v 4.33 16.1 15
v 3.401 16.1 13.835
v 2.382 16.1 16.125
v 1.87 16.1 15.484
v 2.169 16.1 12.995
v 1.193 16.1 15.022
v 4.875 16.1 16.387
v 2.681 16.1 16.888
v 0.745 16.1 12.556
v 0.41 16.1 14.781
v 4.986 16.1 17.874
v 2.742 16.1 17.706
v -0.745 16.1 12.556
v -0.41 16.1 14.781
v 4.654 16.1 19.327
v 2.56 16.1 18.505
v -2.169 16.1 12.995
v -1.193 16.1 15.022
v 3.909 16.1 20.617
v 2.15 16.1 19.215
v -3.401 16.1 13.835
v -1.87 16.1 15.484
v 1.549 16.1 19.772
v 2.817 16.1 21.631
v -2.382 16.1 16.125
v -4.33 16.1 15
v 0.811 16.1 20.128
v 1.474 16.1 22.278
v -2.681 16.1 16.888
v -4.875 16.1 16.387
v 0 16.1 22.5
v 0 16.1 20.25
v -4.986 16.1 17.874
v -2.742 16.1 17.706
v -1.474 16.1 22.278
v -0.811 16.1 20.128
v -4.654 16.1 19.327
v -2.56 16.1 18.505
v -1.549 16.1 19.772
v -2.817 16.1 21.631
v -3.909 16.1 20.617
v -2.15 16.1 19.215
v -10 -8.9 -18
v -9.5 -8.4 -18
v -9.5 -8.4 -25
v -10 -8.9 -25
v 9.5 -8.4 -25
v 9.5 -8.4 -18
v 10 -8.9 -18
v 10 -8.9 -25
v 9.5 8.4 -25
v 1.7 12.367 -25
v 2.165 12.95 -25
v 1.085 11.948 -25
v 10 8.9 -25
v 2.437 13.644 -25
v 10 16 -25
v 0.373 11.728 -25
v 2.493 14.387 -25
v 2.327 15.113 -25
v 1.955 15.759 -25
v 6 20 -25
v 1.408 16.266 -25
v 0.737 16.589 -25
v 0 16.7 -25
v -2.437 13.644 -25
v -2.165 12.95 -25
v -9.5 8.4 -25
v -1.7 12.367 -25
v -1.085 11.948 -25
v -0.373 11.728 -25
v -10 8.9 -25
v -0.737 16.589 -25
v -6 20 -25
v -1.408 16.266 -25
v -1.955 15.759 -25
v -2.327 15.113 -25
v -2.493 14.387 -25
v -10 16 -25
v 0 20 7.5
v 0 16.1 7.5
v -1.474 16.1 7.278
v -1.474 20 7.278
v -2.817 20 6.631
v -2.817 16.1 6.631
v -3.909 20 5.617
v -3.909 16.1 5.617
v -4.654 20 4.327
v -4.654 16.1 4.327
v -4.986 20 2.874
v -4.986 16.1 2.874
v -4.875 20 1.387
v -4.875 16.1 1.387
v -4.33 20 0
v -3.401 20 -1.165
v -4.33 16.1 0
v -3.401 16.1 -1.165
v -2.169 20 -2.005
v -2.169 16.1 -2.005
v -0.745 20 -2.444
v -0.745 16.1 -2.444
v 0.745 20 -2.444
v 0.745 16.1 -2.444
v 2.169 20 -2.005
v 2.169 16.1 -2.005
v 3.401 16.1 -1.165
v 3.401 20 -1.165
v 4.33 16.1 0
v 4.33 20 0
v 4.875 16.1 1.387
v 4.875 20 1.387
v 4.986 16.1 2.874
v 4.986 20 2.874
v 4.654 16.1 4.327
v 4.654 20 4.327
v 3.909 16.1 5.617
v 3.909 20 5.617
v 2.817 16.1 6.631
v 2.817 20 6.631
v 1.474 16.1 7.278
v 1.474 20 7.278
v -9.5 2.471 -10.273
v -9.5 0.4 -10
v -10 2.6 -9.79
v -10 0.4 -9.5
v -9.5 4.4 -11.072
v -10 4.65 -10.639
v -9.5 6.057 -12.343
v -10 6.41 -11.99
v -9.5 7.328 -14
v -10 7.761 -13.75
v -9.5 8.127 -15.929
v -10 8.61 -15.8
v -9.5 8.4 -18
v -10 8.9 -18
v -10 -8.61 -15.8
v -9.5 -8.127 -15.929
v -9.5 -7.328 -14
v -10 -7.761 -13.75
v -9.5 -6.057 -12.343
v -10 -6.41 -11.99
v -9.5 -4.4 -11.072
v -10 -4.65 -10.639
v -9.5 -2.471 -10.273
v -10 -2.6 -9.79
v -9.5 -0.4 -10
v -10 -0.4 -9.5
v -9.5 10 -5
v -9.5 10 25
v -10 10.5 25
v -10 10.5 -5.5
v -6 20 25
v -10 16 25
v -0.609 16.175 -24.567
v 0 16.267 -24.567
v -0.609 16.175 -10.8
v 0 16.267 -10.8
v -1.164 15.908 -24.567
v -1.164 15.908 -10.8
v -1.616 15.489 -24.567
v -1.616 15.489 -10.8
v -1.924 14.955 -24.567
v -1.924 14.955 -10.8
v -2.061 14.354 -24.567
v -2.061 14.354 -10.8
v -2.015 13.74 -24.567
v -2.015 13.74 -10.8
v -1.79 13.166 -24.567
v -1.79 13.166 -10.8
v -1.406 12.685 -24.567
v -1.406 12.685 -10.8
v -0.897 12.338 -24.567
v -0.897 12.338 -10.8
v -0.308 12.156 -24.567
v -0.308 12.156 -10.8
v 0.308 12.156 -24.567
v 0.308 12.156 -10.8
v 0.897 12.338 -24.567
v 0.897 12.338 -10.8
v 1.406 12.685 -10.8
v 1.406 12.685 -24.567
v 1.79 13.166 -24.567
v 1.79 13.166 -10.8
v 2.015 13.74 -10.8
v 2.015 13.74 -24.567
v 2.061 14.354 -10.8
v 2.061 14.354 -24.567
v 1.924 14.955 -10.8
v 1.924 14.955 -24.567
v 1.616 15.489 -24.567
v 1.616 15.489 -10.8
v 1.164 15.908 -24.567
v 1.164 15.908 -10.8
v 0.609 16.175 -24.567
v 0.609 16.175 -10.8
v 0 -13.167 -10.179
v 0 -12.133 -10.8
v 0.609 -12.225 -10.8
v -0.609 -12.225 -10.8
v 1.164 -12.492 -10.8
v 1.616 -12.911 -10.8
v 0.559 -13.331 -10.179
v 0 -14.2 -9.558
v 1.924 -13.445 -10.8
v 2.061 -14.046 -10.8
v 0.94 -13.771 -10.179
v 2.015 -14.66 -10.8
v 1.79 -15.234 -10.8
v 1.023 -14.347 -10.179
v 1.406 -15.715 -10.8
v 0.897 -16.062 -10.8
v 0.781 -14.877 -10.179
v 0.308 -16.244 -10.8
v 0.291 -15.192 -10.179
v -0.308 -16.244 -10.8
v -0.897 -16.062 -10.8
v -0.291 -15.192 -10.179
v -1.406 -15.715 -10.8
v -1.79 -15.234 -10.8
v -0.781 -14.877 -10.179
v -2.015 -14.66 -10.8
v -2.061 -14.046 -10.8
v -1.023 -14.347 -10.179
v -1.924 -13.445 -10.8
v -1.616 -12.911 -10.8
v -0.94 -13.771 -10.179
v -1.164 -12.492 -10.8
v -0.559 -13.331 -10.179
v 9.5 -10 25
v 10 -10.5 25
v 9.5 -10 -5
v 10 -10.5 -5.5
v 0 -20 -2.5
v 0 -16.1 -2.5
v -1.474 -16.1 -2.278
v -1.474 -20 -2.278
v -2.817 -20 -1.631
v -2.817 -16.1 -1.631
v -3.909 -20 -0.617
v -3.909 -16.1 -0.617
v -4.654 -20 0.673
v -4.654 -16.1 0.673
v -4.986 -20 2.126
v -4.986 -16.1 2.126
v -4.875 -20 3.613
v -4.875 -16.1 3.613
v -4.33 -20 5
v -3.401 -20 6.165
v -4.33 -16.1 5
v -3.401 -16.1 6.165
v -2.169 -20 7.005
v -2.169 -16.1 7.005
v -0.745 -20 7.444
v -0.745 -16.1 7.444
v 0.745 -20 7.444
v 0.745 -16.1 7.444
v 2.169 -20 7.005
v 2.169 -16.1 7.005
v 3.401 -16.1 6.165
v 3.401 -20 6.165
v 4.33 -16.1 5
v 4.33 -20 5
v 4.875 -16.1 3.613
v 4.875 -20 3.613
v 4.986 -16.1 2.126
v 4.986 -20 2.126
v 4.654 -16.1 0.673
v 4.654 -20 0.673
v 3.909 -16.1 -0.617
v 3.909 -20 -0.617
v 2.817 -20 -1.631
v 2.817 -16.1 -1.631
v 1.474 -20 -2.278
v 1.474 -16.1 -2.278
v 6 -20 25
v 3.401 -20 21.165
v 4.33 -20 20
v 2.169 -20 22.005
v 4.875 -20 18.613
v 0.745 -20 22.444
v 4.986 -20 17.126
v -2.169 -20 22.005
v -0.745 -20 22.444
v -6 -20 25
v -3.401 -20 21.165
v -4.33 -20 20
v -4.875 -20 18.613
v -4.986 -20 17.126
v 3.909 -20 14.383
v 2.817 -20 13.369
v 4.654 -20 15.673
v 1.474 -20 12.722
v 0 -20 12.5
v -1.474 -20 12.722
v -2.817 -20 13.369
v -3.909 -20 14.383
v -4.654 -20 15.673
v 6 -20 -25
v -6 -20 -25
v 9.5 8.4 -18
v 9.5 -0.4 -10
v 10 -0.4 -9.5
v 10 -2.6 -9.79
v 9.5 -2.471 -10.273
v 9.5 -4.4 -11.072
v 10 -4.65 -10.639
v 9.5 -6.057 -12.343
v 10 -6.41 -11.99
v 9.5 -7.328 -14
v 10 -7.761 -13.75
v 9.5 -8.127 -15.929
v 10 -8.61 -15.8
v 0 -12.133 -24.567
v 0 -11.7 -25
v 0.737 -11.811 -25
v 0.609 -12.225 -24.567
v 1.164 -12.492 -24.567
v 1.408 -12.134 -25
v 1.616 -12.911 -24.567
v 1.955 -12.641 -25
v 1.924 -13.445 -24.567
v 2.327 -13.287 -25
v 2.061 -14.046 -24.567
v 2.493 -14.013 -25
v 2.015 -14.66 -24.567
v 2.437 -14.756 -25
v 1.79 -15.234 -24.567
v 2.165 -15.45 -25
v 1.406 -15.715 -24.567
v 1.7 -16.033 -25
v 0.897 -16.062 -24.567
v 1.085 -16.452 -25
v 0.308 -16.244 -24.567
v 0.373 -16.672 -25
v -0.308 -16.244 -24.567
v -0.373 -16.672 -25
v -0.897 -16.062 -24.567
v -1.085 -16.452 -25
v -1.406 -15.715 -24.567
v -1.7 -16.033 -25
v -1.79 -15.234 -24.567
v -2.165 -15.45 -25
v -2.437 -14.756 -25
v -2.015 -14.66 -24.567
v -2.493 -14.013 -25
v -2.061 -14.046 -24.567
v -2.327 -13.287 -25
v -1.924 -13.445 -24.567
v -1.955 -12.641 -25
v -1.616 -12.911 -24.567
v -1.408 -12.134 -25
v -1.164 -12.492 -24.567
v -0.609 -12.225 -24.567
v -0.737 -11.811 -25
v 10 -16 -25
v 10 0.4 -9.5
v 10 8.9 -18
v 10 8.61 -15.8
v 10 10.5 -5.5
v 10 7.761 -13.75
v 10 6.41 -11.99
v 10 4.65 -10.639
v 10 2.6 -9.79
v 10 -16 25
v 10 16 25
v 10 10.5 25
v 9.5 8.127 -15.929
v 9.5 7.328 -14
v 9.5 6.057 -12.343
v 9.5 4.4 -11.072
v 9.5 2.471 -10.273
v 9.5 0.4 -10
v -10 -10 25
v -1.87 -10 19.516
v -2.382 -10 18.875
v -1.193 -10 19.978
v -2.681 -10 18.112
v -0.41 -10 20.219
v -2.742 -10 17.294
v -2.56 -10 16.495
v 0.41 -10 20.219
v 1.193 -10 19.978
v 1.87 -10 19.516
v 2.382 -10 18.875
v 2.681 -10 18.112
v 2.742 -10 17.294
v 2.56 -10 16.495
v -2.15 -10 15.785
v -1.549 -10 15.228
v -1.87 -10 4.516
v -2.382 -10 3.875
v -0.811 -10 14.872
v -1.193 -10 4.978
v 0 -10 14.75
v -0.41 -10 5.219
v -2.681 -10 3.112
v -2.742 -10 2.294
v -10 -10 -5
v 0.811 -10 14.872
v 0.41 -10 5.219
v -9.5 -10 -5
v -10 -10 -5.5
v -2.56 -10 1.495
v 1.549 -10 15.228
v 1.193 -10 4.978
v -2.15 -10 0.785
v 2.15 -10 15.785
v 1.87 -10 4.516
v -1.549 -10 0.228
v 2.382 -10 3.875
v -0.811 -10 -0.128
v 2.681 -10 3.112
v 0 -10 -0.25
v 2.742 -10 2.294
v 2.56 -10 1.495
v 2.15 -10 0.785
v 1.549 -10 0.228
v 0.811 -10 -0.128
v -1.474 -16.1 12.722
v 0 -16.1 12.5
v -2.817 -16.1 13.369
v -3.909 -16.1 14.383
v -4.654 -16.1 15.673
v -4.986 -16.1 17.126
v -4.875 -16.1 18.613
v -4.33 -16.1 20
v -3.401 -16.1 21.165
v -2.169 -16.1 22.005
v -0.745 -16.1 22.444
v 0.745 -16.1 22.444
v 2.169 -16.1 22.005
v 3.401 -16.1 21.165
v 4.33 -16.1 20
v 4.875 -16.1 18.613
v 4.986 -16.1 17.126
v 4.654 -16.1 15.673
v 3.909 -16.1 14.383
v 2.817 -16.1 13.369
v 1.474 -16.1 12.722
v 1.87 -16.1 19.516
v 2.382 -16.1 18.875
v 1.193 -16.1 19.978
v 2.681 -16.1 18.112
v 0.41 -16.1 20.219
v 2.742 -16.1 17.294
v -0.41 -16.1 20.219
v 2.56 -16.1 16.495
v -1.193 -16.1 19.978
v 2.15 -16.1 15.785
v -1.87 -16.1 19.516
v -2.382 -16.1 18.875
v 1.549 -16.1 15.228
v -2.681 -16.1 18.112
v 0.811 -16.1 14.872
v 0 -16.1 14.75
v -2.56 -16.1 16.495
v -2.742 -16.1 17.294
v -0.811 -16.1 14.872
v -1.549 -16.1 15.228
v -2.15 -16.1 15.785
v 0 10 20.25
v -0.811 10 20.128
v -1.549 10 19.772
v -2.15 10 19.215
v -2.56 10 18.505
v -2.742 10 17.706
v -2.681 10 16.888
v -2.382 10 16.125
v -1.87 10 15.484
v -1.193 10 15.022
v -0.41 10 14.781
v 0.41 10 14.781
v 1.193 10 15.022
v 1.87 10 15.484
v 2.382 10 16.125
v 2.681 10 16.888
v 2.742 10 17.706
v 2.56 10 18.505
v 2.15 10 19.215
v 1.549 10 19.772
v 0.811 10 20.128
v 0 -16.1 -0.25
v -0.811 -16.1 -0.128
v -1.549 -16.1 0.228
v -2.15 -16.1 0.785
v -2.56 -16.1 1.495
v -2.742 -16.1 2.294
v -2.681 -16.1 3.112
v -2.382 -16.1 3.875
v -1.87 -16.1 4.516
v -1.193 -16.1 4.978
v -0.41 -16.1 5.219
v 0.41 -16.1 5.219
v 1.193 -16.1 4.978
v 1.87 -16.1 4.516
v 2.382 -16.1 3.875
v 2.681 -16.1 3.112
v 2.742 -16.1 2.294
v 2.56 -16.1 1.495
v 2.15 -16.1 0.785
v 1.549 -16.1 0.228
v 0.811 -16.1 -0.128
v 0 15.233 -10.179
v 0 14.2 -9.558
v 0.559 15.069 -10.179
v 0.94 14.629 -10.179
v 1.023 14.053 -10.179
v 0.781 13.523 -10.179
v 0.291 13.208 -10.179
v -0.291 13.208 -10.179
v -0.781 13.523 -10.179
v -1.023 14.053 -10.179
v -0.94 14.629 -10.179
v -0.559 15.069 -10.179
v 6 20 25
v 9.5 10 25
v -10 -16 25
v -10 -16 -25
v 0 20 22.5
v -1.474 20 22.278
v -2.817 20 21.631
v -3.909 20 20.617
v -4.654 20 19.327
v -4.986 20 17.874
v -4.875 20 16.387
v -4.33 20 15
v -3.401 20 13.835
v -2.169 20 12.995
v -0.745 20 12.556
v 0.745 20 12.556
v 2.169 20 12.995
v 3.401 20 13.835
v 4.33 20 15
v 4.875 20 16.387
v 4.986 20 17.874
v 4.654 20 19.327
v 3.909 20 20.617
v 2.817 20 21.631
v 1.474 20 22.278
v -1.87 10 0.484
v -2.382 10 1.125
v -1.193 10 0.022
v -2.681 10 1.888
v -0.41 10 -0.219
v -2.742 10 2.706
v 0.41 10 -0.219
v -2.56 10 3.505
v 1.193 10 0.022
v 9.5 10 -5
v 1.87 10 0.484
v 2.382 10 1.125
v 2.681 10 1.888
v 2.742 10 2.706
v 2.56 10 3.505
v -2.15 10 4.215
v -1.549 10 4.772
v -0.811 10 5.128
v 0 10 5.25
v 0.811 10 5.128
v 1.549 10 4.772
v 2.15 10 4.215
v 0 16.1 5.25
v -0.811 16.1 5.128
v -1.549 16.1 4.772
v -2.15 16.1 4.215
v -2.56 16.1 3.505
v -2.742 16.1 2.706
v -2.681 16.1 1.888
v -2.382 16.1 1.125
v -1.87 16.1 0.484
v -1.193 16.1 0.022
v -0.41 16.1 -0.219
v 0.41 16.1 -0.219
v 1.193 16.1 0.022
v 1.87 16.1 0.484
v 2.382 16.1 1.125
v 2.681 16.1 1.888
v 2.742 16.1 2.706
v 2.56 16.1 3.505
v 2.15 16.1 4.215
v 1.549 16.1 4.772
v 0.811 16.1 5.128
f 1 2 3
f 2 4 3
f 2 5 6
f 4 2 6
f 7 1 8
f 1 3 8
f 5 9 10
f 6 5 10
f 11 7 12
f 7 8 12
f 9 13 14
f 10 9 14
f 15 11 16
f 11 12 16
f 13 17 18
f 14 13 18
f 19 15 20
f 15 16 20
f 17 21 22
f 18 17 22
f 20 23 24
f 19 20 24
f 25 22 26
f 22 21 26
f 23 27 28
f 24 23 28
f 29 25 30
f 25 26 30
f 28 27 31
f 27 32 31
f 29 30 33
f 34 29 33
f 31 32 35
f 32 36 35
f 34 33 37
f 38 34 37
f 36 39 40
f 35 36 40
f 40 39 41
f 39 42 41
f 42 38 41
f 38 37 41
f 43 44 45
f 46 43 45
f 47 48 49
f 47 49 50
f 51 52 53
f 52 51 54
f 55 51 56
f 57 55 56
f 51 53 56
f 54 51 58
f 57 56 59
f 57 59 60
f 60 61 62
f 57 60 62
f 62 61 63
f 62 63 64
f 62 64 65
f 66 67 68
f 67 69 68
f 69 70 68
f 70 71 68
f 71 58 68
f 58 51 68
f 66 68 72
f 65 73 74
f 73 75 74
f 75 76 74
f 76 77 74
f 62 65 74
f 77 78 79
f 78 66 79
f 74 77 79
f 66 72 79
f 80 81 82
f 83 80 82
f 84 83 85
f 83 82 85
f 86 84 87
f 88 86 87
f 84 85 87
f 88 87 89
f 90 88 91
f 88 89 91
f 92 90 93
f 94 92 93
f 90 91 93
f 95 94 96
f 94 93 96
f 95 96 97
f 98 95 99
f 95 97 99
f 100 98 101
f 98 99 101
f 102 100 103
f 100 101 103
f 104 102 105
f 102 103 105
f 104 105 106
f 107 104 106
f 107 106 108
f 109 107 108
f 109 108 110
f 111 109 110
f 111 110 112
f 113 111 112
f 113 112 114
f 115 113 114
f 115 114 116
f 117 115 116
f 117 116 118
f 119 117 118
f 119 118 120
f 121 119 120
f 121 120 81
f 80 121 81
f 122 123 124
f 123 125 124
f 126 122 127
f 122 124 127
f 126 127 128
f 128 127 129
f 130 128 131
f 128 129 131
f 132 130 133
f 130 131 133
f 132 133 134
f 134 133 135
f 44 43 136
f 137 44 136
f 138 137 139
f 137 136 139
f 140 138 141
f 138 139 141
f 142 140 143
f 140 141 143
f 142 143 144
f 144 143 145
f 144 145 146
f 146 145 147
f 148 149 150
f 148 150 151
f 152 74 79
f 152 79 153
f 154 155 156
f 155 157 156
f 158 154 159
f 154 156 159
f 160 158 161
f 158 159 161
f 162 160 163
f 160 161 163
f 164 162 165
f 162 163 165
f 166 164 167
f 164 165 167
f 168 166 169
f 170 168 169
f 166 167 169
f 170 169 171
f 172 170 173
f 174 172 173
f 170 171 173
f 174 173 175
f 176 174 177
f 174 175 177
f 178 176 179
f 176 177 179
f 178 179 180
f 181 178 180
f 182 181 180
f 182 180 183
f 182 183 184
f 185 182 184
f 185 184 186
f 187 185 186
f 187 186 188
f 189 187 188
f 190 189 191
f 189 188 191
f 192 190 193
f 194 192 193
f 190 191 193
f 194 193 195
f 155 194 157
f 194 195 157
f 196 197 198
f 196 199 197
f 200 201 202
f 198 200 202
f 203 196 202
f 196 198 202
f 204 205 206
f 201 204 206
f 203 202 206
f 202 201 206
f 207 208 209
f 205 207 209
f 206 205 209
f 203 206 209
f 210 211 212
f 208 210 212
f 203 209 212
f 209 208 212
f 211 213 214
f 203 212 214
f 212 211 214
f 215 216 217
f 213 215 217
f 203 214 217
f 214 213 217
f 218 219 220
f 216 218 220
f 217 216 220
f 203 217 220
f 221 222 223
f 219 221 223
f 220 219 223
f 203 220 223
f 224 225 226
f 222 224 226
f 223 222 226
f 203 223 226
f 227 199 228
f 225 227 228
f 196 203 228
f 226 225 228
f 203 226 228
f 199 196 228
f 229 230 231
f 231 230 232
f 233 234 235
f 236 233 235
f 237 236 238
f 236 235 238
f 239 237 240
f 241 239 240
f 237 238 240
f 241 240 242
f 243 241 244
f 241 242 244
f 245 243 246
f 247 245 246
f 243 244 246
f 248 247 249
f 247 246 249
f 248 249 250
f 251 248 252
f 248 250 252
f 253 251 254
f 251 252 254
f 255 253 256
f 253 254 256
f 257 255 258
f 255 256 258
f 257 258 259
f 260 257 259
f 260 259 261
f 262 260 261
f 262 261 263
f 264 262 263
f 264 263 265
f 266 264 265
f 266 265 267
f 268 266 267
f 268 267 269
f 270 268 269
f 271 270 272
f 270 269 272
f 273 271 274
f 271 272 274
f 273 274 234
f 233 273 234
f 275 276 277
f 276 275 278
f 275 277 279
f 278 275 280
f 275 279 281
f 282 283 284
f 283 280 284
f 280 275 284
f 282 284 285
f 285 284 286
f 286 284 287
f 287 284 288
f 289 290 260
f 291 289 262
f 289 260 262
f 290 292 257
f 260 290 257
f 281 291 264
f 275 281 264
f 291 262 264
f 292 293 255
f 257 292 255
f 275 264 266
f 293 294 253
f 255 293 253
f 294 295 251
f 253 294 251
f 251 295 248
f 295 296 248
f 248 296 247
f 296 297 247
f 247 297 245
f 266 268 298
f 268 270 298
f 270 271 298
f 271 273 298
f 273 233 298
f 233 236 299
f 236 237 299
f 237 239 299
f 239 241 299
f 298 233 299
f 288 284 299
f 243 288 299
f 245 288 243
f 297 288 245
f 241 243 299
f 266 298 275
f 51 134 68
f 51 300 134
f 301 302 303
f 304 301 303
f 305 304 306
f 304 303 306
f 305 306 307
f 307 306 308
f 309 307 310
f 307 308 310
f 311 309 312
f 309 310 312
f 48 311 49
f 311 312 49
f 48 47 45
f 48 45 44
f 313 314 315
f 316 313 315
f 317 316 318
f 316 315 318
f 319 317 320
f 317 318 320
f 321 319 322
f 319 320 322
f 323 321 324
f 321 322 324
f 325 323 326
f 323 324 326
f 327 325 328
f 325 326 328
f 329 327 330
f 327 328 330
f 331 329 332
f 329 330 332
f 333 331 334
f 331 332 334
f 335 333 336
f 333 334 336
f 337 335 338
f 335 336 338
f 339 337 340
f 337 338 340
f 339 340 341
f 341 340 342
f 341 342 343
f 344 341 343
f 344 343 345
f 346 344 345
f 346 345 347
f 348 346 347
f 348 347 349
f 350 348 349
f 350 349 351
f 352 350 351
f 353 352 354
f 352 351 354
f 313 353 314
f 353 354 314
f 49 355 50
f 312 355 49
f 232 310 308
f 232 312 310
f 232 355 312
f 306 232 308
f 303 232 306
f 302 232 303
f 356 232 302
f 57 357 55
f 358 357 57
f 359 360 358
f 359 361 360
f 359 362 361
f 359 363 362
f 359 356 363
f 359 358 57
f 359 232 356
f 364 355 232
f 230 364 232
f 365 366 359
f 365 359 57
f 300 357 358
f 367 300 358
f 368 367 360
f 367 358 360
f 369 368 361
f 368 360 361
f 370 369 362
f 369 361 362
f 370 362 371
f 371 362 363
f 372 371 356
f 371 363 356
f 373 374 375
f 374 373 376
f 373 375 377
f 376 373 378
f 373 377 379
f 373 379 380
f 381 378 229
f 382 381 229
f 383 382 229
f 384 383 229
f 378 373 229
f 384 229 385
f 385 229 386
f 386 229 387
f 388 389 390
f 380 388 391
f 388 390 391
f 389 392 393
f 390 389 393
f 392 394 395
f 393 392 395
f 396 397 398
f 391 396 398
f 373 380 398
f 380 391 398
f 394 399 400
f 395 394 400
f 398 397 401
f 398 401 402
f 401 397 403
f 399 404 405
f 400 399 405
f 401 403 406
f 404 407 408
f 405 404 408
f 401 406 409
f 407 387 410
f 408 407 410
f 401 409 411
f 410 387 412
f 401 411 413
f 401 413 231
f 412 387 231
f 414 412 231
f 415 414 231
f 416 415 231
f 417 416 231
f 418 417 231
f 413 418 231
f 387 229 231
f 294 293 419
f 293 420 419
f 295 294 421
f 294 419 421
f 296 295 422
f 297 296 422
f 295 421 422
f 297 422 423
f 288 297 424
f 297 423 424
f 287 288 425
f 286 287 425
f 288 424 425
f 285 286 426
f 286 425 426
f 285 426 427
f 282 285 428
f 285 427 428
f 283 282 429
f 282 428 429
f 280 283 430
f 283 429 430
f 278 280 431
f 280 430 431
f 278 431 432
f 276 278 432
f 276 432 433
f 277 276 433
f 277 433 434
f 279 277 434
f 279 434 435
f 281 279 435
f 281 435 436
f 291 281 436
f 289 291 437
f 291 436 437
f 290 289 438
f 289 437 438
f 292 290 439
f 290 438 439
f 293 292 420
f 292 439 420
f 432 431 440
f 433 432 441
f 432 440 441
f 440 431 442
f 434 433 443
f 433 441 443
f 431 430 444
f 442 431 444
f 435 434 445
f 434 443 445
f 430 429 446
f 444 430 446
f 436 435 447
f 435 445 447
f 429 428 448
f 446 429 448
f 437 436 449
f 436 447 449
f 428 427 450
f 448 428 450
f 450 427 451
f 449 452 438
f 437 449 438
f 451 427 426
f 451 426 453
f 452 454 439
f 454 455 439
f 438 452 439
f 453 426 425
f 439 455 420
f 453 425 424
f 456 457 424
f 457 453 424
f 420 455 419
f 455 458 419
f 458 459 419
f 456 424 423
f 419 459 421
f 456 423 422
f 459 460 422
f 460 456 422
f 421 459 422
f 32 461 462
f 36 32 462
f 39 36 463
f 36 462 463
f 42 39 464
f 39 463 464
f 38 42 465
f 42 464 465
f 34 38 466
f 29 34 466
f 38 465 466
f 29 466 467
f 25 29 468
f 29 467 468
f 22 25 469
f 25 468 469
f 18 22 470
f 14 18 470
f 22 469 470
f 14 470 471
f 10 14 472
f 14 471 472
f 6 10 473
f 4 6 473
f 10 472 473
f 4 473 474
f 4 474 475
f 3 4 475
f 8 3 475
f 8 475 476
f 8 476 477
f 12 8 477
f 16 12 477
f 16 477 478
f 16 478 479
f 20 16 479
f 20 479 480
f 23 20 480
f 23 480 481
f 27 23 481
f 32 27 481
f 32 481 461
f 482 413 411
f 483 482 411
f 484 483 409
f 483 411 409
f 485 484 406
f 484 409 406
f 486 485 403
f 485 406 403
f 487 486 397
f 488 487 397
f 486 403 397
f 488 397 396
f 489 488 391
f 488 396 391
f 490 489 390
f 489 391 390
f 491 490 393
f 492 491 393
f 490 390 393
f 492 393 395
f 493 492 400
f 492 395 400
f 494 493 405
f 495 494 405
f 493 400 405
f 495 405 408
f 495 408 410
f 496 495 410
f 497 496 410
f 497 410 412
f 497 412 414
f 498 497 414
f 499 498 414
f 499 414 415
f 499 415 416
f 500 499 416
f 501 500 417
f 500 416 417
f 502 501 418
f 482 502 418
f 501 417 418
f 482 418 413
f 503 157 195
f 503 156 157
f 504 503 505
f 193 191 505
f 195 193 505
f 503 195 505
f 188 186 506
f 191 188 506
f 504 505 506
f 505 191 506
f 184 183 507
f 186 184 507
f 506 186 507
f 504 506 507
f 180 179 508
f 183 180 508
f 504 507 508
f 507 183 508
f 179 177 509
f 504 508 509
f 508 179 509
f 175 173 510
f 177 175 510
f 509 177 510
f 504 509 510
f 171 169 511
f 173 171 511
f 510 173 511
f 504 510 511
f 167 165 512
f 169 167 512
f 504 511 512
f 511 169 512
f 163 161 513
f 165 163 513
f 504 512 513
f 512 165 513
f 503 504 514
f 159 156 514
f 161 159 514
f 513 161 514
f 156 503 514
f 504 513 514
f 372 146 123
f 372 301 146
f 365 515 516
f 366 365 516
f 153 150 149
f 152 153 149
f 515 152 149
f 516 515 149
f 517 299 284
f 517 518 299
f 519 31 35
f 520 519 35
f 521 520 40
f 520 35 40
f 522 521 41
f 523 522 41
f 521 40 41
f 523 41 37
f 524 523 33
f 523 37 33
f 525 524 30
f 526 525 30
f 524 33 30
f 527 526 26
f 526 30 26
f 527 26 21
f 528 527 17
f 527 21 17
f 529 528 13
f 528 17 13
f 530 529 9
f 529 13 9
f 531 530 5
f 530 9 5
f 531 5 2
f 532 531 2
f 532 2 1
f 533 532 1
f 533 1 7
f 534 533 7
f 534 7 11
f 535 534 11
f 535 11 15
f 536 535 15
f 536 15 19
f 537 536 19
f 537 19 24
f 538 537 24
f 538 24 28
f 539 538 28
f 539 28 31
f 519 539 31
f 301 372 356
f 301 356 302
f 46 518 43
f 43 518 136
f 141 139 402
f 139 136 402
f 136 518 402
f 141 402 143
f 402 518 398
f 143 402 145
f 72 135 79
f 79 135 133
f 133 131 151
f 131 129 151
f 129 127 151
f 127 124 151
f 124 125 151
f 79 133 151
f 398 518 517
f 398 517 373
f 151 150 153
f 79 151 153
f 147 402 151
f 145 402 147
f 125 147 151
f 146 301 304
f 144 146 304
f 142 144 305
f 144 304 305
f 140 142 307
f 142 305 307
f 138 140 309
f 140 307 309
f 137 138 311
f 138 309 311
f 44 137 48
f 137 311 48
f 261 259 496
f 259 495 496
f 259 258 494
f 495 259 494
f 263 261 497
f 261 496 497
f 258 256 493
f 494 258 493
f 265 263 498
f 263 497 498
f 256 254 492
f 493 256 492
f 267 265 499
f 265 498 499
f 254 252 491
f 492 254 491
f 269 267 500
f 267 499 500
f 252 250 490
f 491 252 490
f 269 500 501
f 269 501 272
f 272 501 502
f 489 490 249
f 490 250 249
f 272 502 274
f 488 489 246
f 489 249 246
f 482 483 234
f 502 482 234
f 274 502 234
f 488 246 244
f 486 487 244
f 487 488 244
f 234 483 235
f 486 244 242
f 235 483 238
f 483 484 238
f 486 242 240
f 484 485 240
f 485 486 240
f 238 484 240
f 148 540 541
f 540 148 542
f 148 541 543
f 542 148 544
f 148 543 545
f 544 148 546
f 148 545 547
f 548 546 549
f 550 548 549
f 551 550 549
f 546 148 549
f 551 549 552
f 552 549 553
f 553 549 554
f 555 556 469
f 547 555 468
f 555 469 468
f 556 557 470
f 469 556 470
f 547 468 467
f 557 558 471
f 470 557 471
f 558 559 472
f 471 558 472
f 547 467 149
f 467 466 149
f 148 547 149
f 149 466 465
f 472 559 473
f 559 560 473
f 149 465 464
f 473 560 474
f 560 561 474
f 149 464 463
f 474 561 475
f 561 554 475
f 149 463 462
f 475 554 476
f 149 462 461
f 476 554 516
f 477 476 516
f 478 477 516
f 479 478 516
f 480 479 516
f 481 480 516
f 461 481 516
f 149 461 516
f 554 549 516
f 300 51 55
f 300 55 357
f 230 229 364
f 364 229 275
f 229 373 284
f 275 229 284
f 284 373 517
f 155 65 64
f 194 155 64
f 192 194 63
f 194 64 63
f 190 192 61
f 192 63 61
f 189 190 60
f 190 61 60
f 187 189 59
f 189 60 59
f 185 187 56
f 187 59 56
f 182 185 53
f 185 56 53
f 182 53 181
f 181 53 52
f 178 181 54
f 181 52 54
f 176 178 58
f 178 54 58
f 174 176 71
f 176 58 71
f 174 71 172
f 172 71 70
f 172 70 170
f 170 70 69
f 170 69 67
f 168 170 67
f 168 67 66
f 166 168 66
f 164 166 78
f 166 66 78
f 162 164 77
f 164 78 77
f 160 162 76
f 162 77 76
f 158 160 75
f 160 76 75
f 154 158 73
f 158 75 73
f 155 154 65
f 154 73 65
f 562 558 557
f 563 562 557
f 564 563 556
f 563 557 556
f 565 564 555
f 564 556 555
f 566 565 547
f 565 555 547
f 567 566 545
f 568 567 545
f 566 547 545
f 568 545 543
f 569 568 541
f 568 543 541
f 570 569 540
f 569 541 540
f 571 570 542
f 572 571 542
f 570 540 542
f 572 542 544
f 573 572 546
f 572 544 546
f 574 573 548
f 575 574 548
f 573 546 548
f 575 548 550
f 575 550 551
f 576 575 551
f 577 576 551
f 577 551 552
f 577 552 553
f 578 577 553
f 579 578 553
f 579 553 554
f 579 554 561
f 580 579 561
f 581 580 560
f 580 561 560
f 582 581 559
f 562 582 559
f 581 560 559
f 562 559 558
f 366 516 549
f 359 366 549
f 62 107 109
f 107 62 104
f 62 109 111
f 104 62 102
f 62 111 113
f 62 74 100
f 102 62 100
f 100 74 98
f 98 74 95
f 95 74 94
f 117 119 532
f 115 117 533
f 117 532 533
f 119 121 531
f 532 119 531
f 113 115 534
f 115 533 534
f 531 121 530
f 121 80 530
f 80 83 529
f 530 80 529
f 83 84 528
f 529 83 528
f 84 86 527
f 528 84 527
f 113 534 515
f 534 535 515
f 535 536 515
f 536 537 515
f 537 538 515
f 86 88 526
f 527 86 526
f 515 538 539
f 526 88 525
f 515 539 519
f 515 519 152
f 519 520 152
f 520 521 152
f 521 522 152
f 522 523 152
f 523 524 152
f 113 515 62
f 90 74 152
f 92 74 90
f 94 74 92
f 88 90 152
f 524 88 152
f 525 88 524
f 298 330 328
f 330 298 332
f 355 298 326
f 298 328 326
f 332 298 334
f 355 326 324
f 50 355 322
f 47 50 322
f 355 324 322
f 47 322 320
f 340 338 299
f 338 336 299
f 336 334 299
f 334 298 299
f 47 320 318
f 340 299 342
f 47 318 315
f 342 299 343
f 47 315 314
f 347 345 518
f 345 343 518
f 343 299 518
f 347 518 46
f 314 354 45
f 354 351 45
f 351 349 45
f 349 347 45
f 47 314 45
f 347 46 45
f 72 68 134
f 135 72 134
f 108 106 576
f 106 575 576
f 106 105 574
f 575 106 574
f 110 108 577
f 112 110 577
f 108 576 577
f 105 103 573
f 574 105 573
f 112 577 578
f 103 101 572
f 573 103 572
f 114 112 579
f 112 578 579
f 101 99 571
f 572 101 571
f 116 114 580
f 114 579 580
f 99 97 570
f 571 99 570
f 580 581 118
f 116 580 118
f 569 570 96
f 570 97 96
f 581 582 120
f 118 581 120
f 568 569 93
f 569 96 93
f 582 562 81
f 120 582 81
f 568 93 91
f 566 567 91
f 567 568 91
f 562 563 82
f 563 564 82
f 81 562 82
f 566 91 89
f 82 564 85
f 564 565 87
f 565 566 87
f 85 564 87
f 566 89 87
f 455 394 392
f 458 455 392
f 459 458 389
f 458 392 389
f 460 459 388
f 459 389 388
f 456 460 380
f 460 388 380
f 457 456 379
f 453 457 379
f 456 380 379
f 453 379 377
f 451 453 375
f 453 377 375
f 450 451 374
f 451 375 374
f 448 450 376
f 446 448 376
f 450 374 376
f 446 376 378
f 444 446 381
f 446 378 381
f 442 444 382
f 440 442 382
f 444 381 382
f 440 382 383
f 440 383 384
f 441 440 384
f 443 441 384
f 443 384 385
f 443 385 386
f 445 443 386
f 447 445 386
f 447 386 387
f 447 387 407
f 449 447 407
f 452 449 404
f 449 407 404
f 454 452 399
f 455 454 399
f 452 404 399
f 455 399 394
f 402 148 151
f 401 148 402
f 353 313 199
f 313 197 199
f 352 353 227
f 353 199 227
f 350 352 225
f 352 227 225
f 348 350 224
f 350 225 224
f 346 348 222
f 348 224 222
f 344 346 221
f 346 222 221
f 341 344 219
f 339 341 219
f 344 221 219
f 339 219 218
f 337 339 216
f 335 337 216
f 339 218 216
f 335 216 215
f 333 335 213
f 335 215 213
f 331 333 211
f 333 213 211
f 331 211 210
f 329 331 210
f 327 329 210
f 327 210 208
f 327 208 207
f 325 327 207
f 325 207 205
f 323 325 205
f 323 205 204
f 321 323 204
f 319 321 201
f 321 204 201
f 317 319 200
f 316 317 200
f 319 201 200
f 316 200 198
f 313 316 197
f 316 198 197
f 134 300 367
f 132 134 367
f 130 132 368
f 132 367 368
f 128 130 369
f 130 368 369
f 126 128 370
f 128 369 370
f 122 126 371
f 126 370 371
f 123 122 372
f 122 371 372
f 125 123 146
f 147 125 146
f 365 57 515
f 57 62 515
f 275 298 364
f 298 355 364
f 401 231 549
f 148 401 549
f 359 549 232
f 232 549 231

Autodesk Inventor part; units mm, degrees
ref_plane "YZ Plane" through (0, 0, 0) normal (1, 0, 0) x (0, 1, 0)
ref_plane "XZ Plane" through (0, 0, 0) normal (0, 1, 0) x (-1, 0, 0)
ref_plane "XY Plane" through (0, 0, 0) normal (0, 0, 1) x (1, 0, 0)
sketch "Skizze1" plane through (0, 0, 0) normal (1, 0, 0) x (0, 1, 0)
  line L0 (-28, 0) -> (28, 0) construction
  line L1 (0, 35) -> (0, -35) construction
  line L2 (-20, -25) -> (20, -25)
  line L3 (20, -25) -> (20, 25)
  line L4 (20, 25) -> (-20, 25)
  line L5 (-20, 25) -> (-20, -25)
  line L6 (-20, -25) -> (20, 25) construction
  line L7 (20, -25) -> (-20, 25) construction
  point P0 (0, 0)
  dimension "d0" = 40
  dimension "d1" = 50
extrude "Grundkörper" add sketch "Skizze1" along normal mid plane 20
sketch "Skizze2" plane through (10, 0, 0) normal (1, 0, 0) x (0, 0, -1)
  line L0 (-25, 20) -> (-25, -20) construction
  line L1 (0, -28) -> (0, 28) construction
  line L2 (-35, 0) -> (35, 0) construction
  line L3 (-25, -10) -> (5, -10)
  line L4 (5, -10) -> (5, 10)
  line L5 (5, 10) -> (-25, 10)
  line L6 (-25, 10) -> (-25, -10)
  line L7 (25, -20) -> (25, 20) construction
  line L8 (25, -8.4) -> (18, -8.4)
  line L9 (10, -0.4) -> (10, 0.4)
  line L10 (18, 8.4) -> (25, 8.4)
  line L11 (25, -8.4) -> (25, 8.4)
  arc A0 (10, -0.4) -> (18, -8.4) centre (18, -0.4) ccw
  arc A1 (18, 8.4) -> (10, 0.4) centre (18, 0.4) ccw
  point P0 (0, 0)
  dimension "d4" = 30
  dimension "d5" = 20
  dimension "d14" = 15
  dimension "d15" = 16.8
  dimension "d16" = 8
extrude "Ausschnitt" cut sketch "Skizze2" against normal through all
sketch "Skizze4" plane through (-10, -20, -25) normal (0, -1, 0) x (1, 0, 0)
  line L0 (20, 20) -> (0, 20) construction
  line L1 (20, 50) -> (0, 50) construction
  line L2 (10, 60) -> (10, -10) projected
  line L3 (0, 35) -> (20, 35) construction
  line L4 (0, 0) -> (0, 50) construction
  line L5 (20, 50) -> (20, 0) construction
  point P0 (10, 25)
  point P1 (10, 42.5)
  point P2 (10, 27.5)
  dimension "d19" = 30
  dimension "d20" = 15
  dimension "d21" = 15
hole "DIN7984_M5_Boh" at (0, -20, 17.5) at (0, -20, 2.5) direction (0, 1, 0) diameter 5.5 end up to surface counterbore diameter 10 counterbore depth 3.9
mirror "Spiegeln_DIN7984_M5_Boh" about plane through (0, 0, 0) normal (0, 1, 0) of "DIN7984_M5_Boh"
sketch "Skizze5" plane through (10, -20, -25) normal (0, 0, -1) x (-1, 0, 0)
  line L0 (0, 0) -> (20, 0) construction
  line L1 (20, 11.6) -> (0, 11.6) construction
  line L2 (20, 40) -> (0, 40) construction
  line L3 (0, 28.4) -> (20, 28.4) construction
  line L4 (10, -8) -> (10, 48) construction
  line L5 (-4, 20) -> (24, 20) construction
  line L6 (10, 11.6) -> (10, 0) construction
  point P0 (10, 20)
  point P1 (10, 5.8)
  point P2 (10, 34.2)
  dimension "d29" = 28.4
hole "M5x10" at (0, -14.2, -25) at (0, 14.2, -25) direction (0, 0, 1) diameter 4.134 depth 14.2 tip angle 118 countersink diameter 5 countersink angle 90 thread size "M5x0.8" class "6H" standard "ISO Metric profile"
chamfer "Fase_Allgemein" distance 4 angle 45 4 edges at (10, -20, 0) (-10, -20, 0) (10, 20, 0) (-10, 20, 0)
chamfer "Fase" distance 0.5 angle 45 15 edges at (10, -6.0569, -12.3431) (10, 0, -10) (10, 6.0569, -12.3431) (10, 8.4, -21.5) (10, -8.4, -21.5) (-10, 6.0569, -12.3431) (-10, 0, -10) (-10, -6.0569, -12.3431) (-10, -8.4, -21.5) (-10, 8.4, -21.5) (-10, 0, -5) (-10, 10, 10) (10, -10, 10) (10, 0, -5) (10, 10, 10)
equation "\"d20\" = 0.5 * d19"
equation "\"d21\" = 0.5 * d19"
properties part number "200-50-WHEEL-CONNECTOR-01" material "Aluminium 6061"
